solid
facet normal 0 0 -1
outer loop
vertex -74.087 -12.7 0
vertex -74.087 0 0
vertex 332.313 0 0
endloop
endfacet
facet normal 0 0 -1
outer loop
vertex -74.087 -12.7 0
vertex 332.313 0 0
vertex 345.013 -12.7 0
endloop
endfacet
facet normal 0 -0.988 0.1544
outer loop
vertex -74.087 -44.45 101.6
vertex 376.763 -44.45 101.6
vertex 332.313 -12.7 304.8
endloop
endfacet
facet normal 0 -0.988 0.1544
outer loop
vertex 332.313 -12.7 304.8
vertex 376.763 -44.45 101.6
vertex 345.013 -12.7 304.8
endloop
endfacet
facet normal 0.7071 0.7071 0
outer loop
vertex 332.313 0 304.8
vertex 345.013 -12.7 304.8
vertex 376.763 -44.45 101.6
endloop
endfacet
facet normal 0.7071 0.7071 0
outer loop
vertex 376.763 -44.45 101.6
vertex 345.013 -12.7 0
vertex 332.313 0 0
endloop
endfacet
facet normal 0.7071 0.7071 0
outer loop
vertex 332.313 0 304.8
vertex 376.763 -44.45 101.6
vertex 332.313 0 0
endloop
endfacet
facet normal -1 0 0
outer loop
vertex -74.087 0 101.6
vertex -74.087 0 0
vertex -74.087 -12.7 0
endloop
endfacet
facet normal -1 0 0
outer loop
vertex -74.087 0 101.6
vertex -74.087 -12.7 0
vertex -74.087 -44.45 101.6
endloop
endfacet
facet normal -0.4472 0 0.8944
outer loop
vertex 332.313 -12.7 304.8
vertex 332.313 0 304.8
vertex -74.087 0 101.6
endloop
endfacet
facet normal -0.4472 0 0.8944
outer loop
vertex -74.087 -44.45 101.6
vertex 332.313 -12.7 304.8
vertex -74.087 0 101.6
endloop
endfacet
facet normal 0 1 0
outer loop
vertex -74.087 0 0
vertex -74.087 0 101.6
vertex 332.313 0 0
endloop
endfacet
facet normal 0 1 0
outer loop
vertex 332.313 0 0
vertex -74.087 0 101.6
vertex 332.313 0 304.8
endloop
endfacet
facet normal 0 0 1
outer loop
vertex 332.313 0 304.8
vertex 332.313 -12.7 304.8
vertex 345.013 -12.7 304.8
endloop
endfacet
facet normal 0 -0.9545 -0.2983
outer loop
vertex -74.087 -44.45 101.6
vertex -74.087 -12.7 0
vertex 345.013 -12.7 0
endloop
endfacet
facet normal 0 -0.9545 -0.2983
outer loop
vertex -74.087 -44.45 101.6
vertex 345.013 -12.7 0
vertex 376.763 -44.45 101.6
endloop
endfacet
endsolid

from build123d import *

# Parameters (mm, degrees)
F0_W     = 457.2
F0_H     = 304.8
F1_DEPTH = 44.45
F3_DEPTH = 457.201
F5_DEPTH = 44.451
F7_DEPTH = 304.801


with BuildPart() as f1:
    # F0 (on Front) → F1 (new body)
    with BuildSketch(Plane.XZ):
        with Locations((154.513133, 152.4)):
            Rectangle(F0_W, F0_H)
    extrude(amount=F1_DEPTH)

    # F2 (on face) → F3 (cut, through all)
    with BuildSketch(Plane.YZ.offset(383.113133)):
        Polygon((-44.45, 101.6), (-12.7, 304.8), (-82.839599, 304.8), (-82.839599, 0), (-12.7, 0), align=None)
    extrude(amount=-F3_DEPTH, mode=Mode.SUBTRACT)

    # F4 (on face) → F5 (cut, through all)
    with BuildSketch(Plane(origin=(0, 0, 0), x_dir=(-1, 0, 0), z_dir=(0, 1, 0))):
        Polygon((74.086867, 304.8), (-332.313133, 304.8), (74.086867, 101.6), align=None)
    extrude(amount=-F5_DEPTH, mode=Mode.SUBTRACT)

    # F6 (on face) → F7 (cut, through all)
    with BuildSketch(Plane(origin=(0, 0, 0), x_dir=(1, 0, 0), z_dir=(0, 0, -1))):
        Polygon((332.313133, 0), (383.113133, 0), (383.113133, 50.8), align=None)
    extrude(amount=-F7_DEPTH, mode=Mode.SUBTRACT)


solid = f1.part
